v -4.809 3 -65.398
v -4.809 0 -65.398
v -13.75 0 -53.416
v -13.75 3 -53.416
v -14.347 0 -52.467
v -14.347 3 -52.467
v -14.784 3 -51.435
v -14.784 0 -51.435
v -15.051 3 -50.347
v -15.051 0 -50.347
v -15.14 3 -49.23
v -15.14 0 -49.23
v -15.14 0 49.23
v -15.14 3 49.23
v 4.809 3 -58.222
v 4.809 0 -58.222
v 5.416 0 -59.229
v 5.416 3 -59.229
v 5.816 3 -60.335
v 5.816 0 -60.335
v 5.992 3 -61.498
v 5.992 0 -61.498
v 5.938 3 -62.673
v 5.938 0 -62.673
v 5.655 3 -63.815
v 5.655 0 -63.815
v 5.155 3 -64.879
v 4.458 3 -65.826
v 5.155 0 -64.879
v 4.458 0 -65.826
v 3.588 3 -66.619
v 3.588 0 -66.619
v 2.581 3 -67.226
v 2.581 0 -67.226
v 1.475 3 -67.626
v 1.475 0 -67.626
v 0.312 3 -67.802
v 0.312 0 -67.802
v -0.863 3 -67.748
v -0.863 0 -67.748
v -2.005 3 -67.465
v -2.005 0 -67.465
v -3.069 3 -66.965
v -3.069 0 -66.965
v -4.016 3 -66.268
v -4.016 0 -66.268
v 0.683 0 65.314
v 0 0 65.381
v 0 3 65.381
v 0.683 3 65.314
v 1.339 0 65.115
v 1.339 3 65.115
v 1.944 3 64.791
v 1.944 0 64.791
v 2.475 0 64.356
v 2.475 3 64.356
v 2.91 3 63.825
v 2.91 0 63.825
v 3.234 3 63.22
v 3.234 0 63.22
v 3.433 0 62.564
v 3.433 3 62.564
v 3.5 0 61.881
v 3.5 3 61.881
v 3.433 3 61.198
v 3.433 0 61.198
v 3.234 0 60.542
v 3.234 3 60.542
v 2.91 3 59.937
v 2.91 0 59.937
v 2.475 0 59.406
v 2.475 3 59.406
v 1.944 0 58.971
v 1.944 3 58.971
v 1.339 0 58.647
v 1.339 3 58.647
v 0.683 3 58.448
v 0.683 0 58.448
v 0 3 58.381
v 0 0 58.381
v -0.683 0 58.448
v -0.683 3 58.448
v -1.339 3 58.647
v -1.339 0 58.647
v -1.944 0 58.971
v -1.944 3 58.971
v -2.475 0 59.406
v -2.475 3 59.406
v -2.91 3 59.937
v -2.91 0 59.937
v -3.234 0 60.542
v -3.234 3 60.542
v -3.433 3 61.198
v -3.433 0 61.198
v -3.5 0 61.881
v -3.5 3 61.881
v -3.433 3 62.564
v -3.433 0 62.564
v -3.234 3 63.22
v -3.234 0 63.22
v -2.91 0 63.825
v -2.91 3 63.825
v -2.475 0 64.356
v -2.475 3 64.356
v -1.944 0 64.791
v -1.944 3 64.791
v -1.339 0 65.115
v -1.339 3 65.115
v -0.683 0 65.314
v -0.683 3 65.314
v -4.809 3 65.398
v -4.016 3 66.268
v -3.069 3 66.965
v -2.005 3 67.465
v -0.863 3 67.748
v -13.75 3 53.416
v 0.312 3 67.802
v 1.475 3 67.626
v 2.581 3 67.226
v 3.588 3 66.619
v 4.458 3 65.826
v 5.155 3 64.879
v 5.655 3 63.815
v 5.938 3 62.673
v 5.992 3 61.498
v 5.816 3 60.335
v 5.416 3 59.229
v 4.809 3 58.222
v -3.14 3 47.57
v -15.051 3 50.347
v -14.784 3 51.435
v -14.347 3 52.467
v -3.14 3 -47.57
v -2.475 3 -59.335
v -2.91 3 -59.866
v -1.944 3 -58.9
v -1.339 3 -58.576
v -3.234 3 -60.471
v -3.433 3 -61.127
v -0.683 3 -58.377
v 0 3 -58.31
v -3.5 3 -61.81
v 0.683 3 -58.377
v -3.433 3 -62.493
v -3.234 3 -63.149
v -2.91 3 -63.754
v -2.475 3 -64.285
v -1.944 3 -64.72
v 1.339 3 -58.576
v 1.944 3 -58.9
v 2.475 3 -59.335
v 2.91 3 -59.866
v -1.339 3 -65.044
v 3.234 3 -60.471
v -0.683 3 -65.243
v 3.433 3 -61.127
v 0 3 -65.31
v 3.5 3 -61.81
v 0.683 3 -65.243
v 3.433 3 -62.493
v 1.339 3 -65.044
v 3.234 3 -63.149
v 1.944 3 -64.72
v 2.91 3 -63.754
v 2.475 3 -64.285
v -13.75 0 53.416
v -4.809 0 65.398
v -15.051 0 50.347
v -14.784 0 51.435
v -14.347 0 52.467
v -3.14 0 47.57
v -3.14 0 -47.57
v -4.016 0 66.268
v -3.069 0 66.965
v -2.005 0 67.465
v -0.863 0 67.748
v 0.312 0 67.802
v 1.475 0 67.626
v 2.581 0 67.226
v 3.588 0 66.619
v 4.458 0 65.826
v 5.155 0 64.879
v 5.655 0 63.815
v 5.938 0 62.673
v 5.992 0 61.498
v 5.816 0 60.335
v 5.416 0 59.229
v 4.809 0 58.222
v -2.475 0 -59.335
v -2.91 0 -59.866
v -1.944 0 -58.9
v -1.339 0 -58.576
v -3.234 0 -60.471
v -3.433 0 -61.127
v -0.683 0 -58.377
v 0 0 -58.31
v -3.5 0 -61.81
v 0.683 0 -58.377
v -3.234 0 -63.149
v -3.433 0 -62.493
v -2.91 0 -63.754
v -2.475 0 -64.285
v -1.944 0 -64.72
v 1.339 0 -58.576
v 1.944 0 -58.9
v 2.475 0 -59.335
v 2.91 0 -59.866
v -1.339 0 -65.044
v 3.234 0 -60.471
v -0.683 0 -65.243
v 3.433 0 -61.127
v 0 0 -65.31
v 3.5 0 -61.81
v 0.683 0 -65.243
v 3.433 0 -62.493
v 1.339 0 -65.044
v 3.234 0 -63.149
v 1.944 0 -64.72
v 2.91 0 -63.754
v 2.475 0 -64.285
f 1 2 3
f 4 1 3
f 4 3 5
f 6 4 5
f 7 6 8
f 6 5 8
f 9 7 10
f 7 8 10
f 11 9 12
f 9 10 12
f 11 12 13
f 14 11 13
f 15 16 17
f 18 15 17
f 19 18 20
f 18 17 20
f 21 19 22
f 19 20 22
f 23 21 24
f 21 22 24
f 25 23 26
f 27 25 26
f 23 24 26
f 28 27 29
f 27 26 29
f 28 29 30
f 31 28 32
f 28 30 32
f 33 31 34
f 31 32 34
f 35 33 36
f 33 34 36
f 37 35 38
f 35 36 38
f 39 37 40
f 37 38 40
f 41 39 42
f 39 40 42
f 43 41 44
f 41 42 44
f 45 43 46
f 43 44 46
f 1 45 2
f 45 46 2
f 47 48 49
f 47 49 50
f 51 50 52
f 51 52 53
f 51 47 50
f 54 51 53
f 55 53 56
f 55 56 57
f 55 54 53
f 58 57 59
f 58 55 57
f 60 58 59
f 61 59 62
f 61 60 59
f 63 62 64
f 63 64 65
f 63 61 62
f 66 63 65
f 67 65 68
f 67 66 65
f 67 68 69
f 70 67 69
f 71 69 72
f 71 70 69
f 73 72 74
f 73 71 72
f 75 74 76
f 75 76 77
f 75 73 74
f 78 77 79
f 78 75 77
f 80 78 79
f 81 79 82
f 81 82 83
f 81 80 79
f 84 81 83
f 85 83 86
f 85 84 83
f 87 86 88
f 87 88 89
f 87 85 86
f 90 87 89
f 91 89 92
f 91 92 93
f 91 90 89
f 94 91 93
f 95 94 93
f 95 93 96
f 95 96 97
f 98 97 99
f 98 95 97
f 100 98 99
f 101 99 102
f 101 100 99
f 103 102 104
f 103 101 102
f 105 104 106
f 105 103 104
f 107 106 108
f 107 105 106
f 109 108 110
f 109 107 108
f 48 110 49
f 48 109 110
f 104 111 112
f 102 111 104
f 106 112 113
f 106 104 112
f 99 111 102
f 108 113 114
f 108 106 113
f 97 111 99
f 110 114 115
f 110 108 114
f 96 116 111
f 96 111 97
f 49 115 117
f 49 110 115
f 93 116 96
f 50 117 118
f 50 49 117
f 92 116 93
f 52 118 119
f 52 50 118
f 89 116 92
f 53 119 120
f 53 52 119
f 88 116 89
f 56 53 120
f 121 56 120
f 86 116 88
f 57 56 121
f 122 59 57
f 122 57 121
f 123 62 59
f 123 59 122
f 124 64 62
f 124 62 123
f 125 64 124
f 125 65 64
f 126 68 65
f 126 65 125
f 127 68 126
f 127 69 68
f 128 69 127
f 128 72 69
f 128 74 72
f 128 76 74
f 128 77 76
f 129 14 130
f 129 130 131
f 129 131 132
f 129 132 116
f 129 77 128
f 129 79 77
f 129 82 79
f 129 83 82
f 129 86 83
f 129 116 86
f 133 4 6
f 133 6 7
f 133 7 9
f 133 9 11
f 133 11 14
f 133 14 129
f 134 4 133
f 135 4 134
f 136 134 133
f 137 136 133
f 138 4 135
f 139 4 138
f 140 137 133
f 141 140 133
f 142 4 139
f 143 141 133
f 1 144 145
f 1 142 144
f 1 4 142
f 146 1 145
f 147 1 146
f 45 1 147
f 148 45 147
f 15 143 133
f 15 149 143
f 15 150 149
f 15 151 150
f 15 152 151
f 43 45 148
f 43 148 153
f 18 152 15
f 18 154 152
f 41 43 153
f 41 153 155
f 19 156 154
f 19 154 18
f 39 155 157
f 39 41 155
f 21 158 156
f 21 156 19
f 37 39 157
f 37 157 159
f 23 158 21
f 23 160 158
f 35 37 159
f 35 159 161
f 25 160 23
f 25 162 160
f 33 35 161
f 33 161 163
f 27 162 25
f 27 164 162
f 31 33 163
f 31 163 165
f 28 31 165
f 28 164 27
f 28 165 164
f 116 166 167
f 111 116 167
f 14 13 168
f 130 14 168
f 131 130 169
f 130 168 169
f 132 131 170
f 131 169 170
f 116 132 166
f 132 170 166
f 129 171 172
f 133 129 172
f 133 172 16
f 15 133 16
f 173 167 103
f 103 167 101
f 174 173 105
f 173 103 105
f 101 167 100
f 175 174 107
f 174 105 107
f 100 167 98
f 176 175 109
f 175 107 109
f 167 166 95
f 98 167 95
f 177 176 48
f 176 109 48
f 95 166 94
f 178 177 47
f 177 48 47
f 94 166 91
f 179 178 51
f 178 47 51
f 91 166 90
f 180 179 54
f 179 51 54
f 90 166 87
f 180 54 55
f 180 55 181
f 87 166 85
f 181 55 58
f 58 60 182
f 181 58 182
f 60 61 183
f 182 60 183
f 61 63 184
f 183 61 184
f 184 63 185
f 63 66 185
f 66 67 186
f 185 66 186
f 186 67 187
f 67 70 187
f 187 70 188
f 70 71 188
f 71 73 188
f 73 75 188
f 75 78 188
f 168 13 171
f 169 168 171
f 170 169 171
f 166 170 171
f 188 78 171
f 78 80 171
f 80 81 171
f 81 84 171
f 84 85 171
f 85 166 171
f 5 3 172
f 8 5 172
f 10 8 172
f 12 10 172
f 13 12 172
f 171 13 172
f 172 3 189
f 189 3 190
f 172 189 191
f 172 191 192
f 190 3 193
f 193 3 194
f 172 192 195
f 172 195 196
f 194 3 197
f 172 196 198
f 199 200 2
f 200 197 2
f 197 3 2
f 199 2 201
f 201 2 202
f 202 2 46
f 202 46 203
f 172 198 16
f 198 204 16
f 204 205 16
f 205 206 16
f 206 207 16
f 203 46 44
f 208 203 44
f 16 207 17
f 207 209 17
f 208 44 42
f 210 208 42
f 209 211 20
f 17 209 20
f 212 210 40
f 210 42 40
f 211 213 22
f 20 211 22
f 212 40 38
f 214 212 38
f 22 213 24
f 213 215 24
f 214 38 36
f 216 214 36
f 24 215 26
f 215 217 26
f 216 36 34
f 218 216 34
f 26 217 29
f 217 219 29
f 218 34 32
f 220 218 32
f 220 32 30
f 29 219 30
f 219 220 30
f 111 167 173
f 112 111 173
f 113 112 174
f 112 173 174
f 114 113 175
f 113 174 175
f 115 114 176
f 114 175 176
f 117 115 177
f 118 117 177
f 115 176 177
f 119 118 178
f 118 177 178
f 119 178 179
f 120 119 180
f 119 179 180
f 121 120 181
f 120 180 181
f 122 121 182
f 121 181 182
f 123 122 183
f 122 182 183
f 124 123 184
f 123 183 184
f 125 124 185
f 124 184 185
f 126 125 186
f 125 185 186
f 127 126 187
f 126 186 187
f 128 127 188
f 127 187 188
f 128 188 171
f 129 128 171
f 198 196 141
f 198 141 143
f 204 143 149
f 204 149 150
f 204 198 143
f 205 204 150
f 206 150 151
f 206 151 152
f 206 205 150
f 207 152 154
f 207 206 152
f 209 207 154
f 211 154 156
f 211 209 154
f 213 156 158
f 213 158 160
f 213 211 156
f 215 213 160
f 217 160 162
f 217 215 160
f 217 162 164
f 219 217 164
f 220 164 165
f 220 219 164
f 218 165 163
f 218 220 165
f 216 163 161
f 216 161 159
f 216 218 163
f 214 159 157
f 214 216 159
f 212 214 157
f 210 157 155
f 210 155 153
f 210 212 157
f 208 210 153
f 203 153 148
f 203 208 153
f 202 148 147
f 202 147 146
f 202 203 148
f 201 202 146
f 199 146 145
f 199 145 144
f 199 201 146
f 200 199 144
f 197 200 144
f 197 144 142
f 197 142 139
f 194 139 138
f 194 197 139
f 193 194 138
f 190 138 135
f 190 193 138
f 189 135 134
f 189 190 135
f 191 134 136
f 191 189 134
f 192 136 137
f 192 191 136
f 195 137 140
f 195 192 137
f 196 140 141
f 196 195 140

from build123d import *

# Parameters (mm, degrees)
SKETCH1_R           = 3.5
BOSS_EXTRUDE1_DEPTH = 3


with BuildPart() as part:
    # Sketch1 → Boss-Extrude1 (new body)
    with BuildSketch(Plane(origin=(0, 0, 0), x_dir=(1, 0, 0), z_dir=(0, 1, 0))):
        with BuildLine():
            Line((-4.808650437, 65.398437121), (-13.750473528, 53.416033622))
            ThreePointArc((-13.750473528, 53.416033622), (-14.783823427, 51.435125012), (-15.140381351, 49.229523647))
            Line((-15.140381351, 49.229523647), (-15.140381351, 0))
            Line((-15.140381351, 0), (-15.140381351, -49.229523647))
            ThreePointArc((-15.140381351, -49.229523647), (-14.783823427, -51.435125012), (-13.750473528, -53.416033622))
            Line((-13.750473528, -53.416033622), (-4.808650437, -65.398437121))
            ThreePointArc((-4.808650437, -65.398437121), (3.588437121, -66.618650437), (4.808650437, -58.221562879))
            Line((4.808650437, -58.221562879), (-3.140381351, -47.569539757))
            Line((-3.140381351, -47.569539757), (-3.140381351, 0))
            Line((-3.140381351, 0), (-3.140381351, 47.569539757))
            Line((-3.140381351, 47.569539757), (4.808650437, 58.221562879))
            ThreePointArc((4.808650437, 58.221562879), (3.588437121, 66.618650437), (-4.808650437, 65.398437121))
        make_face()
        with Locations(Location((0, 61.81, 0), (0, 0, 270))):
            Circle(SKETCH1_R, mode=Mode.SUBTRACT)
        with Locations(Location((0, -61.881, 0), (0, 0, 270))):
            Circle(SKETCH1_R, mode=Mode.SUBTRACT)
    extrude(amount=BOSS_EXTRUDE1_DEPTH)


solid = part.part
